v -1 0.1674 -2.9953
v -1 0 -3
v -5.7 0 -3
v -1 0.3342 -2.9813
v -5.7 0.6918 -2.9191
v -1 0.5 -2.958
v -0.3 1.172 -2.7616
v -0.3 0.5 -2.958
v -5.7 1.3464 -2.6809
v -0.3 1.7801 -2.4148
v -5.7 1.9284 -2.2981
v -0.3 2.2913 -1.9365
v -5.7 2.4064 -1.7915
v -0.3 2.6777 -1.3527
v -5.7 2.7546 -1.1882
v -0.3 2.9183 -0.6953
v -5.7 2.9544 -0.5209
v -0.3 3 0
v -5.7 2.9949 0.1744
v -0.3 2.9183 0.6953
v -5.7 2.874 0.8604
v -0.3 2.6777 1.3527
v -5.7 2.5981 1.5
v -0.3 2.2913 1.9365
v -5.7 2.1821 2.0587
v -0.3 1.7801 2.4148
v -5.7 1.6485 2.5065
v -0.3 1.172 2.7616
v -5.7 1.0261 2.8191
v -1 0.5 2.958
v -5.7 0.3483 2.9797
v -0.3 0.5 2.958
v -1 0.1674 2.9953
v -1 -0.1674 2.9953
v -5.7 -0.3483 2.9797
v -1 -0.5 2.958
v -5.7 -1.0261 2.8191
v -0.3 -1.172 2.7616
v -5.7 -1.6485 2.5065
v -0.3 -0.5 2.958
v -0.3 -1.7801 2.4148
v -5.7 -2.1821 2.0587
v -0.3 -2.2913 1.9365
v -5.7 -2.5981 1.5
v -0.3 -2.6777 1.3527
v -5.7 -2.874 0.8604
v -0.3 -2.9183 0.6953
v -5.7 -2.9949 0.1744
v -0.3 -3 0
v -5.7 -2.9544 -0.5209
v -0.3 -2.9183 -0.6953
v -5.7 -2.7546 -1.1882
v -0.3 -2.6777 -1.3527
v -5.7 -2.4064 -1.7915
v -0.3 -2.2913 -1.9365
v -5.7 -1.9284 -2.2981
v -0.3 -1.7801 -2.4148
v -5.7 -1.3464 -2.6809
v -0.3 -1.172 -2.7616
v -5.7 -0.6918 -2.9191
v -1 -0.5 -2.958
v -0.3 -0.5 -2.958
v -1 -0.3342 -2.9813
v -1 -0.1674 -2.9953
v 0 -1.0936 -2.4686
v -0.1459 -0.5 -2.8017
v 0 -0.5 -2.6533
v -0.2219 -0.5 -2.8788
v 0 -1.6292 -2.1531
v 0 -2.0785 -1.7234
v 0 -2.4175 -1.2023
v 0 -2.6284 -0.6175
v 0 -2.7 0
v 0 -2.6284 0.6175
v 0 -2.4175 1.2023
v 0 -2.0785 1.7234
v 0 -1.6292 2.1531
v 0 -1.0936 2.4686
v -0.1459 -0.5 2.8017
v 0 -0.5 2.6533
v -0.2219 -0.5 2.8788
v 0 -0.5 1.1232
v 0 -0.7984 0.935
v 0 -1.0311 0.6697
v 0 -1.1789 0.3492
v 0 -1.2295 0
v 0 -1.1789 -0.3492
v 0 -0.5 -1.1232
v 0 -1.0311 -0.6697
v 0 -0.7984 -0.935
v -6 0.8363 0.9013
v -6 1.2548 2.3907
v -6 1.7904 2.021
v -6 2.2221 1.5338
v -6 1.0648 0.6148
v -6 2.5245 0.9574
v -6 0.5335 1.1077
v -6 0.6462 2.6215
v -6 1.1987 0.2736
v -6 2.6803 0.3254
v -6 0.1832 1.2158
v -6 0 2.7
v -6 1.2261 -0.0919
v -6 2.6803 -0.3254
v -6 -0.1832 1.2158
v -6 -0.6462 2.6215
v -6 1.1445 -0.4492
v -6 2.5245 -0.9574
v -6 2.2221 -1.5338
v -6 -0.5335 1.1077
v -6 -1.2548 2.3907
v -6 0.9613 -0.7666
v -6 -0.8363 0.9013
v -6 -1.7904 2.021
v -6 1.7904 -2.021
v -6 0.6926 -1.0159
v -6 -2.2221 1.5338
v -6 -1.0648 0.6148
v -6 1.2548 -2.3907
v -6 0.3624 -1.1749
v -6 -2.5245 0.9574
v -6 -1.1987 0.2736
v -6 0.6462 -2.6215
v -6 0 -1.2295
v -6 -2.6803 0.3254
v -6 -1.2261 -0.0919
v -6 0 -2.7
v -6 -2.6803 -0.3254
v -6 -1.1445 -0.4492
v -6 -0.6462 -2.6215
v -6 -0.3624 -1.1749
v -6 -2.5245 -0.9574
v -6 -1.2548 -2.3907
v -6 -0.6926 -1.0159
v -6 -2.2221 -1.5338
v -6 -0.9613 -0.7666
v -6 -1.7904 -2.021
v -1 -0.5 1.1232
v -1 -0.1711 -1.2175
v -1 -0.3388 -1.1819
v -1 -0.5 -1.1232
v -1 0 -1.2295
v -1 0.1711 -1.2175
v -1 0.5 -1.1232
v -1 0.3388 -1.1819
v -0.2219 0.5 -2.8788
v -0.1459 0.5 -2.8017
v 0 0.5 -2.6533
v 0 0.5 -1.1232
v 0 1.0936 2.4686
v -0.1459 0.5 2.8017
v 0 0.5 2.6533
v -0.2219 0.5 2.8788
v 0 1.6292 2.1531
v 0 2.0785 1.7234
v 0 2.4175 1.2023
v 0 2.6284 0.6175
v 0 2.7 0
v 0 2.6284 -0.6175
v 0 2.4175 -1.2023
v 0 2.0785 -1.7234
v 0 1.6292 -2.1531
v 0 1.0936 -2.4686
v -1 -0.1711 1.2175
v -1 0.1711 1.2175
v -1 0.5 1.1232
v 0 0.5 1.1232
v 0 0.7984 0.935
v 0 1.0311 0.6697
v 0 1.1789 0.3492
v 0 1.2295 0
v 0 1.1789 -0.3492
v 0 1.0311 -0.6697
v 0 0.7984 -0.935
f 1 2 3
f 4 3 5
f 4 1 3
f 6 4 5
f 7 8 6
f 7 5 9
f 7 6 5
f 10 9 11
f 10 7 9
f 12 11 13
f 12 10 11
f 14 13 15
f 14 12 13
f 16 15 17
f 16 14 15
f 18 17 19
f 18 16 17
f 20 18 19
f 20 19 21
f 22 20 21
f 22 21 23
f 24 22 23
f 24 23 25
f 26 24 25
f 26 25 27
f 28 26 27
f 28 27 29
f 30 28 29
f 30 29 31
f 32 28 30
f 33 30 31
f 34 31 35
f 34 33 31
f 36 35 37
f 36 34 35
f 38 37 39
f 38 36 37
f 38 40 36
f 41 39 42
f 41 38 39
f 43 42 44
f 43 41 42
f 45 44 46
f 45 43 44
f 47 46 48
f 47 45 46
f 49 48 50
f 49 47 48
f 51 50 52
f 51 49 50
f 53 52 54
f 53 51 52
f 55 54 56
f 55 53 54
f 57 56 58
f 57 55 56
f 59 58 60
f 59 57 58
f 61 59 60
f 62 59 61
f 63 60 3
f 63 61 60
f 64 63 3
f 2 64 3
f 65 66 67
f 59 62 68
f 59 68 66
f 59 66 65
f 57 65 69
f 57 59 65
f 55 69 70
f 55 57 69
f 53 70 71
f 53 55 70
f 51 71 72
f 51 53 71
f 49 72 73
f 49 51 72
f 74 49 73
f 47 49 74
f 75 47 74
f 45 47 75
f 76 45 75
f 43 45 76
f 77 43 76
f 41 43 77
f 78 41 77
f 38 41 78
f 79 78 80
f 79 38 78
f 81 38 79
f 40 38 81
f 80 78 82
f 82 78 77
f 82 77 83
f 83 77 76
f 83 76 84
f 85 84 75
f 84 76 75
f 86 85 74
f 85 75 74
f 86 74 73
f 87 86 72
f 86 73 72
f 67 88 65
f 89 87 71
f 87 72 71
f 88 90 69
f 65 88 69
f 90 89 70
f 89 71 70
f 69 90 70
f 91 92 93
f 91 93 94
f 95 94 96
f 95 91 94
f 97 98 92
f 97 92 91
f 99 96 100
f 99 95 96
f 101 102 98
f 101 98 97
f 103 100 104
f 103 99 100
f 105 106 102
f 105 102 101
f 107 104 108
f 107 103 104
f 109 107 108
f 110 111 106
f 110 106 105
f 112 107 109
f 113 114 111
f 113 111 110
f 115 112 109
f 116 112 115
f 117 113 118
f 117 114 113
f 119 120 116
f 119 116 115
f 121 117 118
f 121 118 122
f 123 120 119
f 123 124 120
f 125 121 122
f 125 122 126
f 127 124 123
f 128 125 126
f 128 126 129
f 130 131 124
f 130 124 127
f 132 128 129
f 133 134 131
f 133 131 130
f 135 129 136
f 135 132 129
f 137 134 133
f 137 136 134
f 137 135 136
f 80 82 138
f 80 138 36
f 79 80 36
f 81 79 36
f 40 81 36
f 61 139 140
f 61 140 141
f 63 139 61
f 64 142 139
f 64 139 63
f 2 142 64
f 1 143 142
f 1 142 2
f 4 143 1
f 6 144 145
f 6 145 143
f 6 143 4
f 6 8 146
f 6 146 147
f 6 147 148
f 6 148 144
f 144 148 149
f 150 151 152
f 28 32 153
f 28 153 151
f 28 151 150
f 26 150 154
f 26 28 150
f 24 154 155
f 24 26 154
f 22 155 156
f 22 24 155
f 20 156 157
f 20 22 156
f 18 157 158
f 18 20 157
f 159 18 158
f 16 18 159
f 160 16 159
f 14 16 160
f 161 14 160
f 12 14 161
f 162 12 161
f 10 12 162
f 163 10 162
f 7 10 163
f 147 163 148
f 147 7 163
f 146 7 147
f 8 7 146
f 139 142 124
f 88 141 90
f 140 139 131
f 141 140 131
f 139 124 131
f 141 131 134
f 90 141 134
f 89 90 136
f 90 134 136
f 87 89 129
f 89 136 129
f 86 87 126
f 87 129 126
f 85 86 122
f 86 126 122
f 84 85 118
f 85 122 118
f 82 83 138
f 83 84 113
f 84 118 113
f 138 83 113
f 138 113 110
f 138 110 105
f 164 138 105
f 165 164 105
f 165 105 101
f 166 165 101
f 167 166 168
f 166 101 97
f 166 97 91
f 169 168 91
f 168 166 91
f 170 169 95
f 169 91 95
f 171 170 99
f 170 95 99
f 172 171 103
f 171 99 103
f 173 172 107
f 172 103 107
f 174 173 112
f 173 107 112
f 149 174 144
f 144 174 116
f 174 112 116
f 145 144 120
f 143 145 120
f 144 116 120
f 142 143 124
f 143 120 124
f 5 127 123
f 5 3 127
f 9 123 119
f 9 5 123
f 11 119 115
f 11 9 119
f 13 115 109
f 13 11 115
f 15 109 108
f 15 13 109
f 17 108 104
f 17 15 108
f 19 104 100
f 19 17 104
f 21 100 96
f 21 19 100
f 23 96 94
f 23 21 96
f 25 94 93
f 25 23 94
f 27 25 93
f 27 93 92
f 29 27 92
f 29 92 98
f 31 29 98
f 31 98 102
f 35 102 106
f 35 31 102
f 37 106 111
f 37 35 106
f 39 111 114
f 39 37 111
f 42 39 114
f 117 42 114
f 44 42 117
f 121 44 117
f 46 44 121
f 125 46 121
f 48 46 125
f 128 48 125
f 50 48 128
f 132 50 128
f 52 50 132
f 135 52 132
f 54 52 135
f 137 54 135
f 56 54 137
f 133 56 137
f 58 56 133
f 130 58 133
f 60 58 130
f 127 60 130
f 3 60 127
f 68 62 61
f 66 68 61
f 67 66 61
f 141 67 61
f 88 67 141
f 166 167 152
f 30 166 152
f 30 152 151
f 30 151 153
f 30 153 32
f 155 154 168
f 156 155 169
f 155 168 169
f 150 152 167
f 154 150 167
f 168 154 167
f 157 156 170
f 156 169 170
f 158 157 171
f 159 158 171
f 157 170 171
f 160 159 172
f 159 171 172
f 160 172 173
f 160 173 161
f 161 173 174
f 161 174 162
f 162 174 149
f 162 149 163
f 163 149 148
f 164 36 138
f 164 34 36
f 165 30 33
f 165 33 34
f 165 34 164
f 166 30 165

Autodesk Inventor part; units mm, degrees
ref_plane "YZ Plane" through (0, 0, 0) normal (1, 0, 0) x (0, 1, 0)
ref_plane "XZ Plane" through (0, 0, 0) normal (0, 1, 0) x (-1, 0, 0)
ref_plane "XY Plane" through (0, 0, 0) normal (0, 0, 1) x (1, 0, 0)
sketch "スケッチ1" plane through (0, 0, 0) normal (0, 1, 0) x (-1, 0, 0)
  line L0 (0, 0) -> (6, 0)
  line L1 (6, 0) -> (6, -3)
  line L2 (6, -3) -> (0, -3)
  line L3 (0, -3) -> (0, 0)
  dimension "d0" = 6
  dimension "d1" = 3
revolve "回転1" add sketch "スケッチ1" angle 360 about axis through (0, 0, 0) along (-1, 0, 0)
sketch "スケッチ2" plane through (0, 0, 0) normal (1, 0, 0) x (0, 0, -1)
  point P0 (0, 0)
  point P1 (0, 0)
hole "穴1" at (0, 0, 0) direction (-1, 0, 0) diameter 2.459 end through all thread size "M3x0.5" class "6H" standard "ANSI Metric M Profile"
sketch "スケッチ3" plane through (0, 0, 0) normal (1, 0, 0) x (0, 0, -1)
  circle A0 centre (0, 0) radius 3 projected
  line L0 (3, 0) -> (-3, 0)
  line L1 (3, -0.5) -> (-3, -0.5)
  line L2 (3, 0.5) -> (-3, 0.5)
  line L3 (3, 0.5) -> (3, -0.5)
  line L4 (-3, 0.5) -> (-3, -0.5)
  point P0 (-2.958, -0.5)
  point P1 (2.958, -0.5)
  point P2 (2.958, 0.5)
  point P3 (-2.958, 0.5)
  dimension "d10" = 0.5
extrude "押し出し1" cut sketch "スケッチ3" against normal blind 1 contours L0 A0 L2 | A0 L1 L0
chamfer "面取り1" distance 0.3 angle 45 3 edges at (-6, 0, 3) (0, 3, 0) (0, -3, 0)
properties part number "ARU-306S" material "ステンレス鋼 AISI 304"
